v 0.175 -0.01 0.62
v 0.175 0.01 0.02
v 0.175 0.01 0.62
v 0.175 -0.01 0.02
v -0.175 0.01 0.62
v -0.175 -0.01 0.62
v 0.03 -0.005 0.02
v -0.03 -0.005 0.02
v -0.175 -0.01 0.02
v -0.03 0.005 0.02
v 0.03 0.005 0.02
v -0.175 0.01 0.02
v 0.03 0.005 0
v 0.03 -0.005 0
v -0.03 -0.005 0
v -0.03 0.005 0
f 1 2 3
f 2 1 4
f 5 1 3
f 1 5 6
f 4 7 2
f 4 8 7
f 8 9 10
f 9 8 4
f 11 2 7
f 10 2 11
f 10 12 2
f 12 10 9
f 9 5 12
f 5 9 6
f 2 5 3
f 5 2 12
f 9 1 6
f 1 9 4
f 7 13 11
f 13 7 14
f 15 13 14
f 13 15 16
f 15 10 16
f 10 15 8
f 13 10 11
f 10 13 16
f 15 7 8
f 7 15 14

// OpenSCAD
module solar_panel(l=0.25, w=0.15, h=0.01, hubl=0.05, hubw=0.05, hubh=0.01){

union(){
translate([0,0,l/2+hubl-1e-6])
    cube([w,h,l],center=true);
translate([0,0,hubl/2])    
    cube([hubw,hubh,hubl],center=true);
}    
  
    
//translate([0,hubcw/2,0])
//  union(){
//    cube([hubcl,hubcw,hubch],center=true);
//  translate([-sl/2,0,-sh/2]){
//    translate([sl*0.2, 0, -(conh-sh)/2])
//      cube([conl,(sw+ssep)*4-ssep,conh]);
//    translate([sl*0.8-conl, 0, -(conh-sh)/2])
//      cube([conl,(sw+ssep)*4-ssep,conh]);
//    for(i=[0:3]){
//      translate([0, (sw+ssep)*i, 0]){
//        cube([sl,sw,sh]);
//        translate([sep, sep, 0])
//          for(i=[0:2])
//            for(j=[0:1])
//              translate([i*(cl+sep), j*(cw+sep), 0])
//                cube([cl,cw,ch]);
//        }
//    }
//  }
//  }
//}
}
// rotate([90,0,0])
    solar_panel(l=0.6, w=0.35, h=0.02, hubl=0.02, hubw=0.06, hubh=0.01);
